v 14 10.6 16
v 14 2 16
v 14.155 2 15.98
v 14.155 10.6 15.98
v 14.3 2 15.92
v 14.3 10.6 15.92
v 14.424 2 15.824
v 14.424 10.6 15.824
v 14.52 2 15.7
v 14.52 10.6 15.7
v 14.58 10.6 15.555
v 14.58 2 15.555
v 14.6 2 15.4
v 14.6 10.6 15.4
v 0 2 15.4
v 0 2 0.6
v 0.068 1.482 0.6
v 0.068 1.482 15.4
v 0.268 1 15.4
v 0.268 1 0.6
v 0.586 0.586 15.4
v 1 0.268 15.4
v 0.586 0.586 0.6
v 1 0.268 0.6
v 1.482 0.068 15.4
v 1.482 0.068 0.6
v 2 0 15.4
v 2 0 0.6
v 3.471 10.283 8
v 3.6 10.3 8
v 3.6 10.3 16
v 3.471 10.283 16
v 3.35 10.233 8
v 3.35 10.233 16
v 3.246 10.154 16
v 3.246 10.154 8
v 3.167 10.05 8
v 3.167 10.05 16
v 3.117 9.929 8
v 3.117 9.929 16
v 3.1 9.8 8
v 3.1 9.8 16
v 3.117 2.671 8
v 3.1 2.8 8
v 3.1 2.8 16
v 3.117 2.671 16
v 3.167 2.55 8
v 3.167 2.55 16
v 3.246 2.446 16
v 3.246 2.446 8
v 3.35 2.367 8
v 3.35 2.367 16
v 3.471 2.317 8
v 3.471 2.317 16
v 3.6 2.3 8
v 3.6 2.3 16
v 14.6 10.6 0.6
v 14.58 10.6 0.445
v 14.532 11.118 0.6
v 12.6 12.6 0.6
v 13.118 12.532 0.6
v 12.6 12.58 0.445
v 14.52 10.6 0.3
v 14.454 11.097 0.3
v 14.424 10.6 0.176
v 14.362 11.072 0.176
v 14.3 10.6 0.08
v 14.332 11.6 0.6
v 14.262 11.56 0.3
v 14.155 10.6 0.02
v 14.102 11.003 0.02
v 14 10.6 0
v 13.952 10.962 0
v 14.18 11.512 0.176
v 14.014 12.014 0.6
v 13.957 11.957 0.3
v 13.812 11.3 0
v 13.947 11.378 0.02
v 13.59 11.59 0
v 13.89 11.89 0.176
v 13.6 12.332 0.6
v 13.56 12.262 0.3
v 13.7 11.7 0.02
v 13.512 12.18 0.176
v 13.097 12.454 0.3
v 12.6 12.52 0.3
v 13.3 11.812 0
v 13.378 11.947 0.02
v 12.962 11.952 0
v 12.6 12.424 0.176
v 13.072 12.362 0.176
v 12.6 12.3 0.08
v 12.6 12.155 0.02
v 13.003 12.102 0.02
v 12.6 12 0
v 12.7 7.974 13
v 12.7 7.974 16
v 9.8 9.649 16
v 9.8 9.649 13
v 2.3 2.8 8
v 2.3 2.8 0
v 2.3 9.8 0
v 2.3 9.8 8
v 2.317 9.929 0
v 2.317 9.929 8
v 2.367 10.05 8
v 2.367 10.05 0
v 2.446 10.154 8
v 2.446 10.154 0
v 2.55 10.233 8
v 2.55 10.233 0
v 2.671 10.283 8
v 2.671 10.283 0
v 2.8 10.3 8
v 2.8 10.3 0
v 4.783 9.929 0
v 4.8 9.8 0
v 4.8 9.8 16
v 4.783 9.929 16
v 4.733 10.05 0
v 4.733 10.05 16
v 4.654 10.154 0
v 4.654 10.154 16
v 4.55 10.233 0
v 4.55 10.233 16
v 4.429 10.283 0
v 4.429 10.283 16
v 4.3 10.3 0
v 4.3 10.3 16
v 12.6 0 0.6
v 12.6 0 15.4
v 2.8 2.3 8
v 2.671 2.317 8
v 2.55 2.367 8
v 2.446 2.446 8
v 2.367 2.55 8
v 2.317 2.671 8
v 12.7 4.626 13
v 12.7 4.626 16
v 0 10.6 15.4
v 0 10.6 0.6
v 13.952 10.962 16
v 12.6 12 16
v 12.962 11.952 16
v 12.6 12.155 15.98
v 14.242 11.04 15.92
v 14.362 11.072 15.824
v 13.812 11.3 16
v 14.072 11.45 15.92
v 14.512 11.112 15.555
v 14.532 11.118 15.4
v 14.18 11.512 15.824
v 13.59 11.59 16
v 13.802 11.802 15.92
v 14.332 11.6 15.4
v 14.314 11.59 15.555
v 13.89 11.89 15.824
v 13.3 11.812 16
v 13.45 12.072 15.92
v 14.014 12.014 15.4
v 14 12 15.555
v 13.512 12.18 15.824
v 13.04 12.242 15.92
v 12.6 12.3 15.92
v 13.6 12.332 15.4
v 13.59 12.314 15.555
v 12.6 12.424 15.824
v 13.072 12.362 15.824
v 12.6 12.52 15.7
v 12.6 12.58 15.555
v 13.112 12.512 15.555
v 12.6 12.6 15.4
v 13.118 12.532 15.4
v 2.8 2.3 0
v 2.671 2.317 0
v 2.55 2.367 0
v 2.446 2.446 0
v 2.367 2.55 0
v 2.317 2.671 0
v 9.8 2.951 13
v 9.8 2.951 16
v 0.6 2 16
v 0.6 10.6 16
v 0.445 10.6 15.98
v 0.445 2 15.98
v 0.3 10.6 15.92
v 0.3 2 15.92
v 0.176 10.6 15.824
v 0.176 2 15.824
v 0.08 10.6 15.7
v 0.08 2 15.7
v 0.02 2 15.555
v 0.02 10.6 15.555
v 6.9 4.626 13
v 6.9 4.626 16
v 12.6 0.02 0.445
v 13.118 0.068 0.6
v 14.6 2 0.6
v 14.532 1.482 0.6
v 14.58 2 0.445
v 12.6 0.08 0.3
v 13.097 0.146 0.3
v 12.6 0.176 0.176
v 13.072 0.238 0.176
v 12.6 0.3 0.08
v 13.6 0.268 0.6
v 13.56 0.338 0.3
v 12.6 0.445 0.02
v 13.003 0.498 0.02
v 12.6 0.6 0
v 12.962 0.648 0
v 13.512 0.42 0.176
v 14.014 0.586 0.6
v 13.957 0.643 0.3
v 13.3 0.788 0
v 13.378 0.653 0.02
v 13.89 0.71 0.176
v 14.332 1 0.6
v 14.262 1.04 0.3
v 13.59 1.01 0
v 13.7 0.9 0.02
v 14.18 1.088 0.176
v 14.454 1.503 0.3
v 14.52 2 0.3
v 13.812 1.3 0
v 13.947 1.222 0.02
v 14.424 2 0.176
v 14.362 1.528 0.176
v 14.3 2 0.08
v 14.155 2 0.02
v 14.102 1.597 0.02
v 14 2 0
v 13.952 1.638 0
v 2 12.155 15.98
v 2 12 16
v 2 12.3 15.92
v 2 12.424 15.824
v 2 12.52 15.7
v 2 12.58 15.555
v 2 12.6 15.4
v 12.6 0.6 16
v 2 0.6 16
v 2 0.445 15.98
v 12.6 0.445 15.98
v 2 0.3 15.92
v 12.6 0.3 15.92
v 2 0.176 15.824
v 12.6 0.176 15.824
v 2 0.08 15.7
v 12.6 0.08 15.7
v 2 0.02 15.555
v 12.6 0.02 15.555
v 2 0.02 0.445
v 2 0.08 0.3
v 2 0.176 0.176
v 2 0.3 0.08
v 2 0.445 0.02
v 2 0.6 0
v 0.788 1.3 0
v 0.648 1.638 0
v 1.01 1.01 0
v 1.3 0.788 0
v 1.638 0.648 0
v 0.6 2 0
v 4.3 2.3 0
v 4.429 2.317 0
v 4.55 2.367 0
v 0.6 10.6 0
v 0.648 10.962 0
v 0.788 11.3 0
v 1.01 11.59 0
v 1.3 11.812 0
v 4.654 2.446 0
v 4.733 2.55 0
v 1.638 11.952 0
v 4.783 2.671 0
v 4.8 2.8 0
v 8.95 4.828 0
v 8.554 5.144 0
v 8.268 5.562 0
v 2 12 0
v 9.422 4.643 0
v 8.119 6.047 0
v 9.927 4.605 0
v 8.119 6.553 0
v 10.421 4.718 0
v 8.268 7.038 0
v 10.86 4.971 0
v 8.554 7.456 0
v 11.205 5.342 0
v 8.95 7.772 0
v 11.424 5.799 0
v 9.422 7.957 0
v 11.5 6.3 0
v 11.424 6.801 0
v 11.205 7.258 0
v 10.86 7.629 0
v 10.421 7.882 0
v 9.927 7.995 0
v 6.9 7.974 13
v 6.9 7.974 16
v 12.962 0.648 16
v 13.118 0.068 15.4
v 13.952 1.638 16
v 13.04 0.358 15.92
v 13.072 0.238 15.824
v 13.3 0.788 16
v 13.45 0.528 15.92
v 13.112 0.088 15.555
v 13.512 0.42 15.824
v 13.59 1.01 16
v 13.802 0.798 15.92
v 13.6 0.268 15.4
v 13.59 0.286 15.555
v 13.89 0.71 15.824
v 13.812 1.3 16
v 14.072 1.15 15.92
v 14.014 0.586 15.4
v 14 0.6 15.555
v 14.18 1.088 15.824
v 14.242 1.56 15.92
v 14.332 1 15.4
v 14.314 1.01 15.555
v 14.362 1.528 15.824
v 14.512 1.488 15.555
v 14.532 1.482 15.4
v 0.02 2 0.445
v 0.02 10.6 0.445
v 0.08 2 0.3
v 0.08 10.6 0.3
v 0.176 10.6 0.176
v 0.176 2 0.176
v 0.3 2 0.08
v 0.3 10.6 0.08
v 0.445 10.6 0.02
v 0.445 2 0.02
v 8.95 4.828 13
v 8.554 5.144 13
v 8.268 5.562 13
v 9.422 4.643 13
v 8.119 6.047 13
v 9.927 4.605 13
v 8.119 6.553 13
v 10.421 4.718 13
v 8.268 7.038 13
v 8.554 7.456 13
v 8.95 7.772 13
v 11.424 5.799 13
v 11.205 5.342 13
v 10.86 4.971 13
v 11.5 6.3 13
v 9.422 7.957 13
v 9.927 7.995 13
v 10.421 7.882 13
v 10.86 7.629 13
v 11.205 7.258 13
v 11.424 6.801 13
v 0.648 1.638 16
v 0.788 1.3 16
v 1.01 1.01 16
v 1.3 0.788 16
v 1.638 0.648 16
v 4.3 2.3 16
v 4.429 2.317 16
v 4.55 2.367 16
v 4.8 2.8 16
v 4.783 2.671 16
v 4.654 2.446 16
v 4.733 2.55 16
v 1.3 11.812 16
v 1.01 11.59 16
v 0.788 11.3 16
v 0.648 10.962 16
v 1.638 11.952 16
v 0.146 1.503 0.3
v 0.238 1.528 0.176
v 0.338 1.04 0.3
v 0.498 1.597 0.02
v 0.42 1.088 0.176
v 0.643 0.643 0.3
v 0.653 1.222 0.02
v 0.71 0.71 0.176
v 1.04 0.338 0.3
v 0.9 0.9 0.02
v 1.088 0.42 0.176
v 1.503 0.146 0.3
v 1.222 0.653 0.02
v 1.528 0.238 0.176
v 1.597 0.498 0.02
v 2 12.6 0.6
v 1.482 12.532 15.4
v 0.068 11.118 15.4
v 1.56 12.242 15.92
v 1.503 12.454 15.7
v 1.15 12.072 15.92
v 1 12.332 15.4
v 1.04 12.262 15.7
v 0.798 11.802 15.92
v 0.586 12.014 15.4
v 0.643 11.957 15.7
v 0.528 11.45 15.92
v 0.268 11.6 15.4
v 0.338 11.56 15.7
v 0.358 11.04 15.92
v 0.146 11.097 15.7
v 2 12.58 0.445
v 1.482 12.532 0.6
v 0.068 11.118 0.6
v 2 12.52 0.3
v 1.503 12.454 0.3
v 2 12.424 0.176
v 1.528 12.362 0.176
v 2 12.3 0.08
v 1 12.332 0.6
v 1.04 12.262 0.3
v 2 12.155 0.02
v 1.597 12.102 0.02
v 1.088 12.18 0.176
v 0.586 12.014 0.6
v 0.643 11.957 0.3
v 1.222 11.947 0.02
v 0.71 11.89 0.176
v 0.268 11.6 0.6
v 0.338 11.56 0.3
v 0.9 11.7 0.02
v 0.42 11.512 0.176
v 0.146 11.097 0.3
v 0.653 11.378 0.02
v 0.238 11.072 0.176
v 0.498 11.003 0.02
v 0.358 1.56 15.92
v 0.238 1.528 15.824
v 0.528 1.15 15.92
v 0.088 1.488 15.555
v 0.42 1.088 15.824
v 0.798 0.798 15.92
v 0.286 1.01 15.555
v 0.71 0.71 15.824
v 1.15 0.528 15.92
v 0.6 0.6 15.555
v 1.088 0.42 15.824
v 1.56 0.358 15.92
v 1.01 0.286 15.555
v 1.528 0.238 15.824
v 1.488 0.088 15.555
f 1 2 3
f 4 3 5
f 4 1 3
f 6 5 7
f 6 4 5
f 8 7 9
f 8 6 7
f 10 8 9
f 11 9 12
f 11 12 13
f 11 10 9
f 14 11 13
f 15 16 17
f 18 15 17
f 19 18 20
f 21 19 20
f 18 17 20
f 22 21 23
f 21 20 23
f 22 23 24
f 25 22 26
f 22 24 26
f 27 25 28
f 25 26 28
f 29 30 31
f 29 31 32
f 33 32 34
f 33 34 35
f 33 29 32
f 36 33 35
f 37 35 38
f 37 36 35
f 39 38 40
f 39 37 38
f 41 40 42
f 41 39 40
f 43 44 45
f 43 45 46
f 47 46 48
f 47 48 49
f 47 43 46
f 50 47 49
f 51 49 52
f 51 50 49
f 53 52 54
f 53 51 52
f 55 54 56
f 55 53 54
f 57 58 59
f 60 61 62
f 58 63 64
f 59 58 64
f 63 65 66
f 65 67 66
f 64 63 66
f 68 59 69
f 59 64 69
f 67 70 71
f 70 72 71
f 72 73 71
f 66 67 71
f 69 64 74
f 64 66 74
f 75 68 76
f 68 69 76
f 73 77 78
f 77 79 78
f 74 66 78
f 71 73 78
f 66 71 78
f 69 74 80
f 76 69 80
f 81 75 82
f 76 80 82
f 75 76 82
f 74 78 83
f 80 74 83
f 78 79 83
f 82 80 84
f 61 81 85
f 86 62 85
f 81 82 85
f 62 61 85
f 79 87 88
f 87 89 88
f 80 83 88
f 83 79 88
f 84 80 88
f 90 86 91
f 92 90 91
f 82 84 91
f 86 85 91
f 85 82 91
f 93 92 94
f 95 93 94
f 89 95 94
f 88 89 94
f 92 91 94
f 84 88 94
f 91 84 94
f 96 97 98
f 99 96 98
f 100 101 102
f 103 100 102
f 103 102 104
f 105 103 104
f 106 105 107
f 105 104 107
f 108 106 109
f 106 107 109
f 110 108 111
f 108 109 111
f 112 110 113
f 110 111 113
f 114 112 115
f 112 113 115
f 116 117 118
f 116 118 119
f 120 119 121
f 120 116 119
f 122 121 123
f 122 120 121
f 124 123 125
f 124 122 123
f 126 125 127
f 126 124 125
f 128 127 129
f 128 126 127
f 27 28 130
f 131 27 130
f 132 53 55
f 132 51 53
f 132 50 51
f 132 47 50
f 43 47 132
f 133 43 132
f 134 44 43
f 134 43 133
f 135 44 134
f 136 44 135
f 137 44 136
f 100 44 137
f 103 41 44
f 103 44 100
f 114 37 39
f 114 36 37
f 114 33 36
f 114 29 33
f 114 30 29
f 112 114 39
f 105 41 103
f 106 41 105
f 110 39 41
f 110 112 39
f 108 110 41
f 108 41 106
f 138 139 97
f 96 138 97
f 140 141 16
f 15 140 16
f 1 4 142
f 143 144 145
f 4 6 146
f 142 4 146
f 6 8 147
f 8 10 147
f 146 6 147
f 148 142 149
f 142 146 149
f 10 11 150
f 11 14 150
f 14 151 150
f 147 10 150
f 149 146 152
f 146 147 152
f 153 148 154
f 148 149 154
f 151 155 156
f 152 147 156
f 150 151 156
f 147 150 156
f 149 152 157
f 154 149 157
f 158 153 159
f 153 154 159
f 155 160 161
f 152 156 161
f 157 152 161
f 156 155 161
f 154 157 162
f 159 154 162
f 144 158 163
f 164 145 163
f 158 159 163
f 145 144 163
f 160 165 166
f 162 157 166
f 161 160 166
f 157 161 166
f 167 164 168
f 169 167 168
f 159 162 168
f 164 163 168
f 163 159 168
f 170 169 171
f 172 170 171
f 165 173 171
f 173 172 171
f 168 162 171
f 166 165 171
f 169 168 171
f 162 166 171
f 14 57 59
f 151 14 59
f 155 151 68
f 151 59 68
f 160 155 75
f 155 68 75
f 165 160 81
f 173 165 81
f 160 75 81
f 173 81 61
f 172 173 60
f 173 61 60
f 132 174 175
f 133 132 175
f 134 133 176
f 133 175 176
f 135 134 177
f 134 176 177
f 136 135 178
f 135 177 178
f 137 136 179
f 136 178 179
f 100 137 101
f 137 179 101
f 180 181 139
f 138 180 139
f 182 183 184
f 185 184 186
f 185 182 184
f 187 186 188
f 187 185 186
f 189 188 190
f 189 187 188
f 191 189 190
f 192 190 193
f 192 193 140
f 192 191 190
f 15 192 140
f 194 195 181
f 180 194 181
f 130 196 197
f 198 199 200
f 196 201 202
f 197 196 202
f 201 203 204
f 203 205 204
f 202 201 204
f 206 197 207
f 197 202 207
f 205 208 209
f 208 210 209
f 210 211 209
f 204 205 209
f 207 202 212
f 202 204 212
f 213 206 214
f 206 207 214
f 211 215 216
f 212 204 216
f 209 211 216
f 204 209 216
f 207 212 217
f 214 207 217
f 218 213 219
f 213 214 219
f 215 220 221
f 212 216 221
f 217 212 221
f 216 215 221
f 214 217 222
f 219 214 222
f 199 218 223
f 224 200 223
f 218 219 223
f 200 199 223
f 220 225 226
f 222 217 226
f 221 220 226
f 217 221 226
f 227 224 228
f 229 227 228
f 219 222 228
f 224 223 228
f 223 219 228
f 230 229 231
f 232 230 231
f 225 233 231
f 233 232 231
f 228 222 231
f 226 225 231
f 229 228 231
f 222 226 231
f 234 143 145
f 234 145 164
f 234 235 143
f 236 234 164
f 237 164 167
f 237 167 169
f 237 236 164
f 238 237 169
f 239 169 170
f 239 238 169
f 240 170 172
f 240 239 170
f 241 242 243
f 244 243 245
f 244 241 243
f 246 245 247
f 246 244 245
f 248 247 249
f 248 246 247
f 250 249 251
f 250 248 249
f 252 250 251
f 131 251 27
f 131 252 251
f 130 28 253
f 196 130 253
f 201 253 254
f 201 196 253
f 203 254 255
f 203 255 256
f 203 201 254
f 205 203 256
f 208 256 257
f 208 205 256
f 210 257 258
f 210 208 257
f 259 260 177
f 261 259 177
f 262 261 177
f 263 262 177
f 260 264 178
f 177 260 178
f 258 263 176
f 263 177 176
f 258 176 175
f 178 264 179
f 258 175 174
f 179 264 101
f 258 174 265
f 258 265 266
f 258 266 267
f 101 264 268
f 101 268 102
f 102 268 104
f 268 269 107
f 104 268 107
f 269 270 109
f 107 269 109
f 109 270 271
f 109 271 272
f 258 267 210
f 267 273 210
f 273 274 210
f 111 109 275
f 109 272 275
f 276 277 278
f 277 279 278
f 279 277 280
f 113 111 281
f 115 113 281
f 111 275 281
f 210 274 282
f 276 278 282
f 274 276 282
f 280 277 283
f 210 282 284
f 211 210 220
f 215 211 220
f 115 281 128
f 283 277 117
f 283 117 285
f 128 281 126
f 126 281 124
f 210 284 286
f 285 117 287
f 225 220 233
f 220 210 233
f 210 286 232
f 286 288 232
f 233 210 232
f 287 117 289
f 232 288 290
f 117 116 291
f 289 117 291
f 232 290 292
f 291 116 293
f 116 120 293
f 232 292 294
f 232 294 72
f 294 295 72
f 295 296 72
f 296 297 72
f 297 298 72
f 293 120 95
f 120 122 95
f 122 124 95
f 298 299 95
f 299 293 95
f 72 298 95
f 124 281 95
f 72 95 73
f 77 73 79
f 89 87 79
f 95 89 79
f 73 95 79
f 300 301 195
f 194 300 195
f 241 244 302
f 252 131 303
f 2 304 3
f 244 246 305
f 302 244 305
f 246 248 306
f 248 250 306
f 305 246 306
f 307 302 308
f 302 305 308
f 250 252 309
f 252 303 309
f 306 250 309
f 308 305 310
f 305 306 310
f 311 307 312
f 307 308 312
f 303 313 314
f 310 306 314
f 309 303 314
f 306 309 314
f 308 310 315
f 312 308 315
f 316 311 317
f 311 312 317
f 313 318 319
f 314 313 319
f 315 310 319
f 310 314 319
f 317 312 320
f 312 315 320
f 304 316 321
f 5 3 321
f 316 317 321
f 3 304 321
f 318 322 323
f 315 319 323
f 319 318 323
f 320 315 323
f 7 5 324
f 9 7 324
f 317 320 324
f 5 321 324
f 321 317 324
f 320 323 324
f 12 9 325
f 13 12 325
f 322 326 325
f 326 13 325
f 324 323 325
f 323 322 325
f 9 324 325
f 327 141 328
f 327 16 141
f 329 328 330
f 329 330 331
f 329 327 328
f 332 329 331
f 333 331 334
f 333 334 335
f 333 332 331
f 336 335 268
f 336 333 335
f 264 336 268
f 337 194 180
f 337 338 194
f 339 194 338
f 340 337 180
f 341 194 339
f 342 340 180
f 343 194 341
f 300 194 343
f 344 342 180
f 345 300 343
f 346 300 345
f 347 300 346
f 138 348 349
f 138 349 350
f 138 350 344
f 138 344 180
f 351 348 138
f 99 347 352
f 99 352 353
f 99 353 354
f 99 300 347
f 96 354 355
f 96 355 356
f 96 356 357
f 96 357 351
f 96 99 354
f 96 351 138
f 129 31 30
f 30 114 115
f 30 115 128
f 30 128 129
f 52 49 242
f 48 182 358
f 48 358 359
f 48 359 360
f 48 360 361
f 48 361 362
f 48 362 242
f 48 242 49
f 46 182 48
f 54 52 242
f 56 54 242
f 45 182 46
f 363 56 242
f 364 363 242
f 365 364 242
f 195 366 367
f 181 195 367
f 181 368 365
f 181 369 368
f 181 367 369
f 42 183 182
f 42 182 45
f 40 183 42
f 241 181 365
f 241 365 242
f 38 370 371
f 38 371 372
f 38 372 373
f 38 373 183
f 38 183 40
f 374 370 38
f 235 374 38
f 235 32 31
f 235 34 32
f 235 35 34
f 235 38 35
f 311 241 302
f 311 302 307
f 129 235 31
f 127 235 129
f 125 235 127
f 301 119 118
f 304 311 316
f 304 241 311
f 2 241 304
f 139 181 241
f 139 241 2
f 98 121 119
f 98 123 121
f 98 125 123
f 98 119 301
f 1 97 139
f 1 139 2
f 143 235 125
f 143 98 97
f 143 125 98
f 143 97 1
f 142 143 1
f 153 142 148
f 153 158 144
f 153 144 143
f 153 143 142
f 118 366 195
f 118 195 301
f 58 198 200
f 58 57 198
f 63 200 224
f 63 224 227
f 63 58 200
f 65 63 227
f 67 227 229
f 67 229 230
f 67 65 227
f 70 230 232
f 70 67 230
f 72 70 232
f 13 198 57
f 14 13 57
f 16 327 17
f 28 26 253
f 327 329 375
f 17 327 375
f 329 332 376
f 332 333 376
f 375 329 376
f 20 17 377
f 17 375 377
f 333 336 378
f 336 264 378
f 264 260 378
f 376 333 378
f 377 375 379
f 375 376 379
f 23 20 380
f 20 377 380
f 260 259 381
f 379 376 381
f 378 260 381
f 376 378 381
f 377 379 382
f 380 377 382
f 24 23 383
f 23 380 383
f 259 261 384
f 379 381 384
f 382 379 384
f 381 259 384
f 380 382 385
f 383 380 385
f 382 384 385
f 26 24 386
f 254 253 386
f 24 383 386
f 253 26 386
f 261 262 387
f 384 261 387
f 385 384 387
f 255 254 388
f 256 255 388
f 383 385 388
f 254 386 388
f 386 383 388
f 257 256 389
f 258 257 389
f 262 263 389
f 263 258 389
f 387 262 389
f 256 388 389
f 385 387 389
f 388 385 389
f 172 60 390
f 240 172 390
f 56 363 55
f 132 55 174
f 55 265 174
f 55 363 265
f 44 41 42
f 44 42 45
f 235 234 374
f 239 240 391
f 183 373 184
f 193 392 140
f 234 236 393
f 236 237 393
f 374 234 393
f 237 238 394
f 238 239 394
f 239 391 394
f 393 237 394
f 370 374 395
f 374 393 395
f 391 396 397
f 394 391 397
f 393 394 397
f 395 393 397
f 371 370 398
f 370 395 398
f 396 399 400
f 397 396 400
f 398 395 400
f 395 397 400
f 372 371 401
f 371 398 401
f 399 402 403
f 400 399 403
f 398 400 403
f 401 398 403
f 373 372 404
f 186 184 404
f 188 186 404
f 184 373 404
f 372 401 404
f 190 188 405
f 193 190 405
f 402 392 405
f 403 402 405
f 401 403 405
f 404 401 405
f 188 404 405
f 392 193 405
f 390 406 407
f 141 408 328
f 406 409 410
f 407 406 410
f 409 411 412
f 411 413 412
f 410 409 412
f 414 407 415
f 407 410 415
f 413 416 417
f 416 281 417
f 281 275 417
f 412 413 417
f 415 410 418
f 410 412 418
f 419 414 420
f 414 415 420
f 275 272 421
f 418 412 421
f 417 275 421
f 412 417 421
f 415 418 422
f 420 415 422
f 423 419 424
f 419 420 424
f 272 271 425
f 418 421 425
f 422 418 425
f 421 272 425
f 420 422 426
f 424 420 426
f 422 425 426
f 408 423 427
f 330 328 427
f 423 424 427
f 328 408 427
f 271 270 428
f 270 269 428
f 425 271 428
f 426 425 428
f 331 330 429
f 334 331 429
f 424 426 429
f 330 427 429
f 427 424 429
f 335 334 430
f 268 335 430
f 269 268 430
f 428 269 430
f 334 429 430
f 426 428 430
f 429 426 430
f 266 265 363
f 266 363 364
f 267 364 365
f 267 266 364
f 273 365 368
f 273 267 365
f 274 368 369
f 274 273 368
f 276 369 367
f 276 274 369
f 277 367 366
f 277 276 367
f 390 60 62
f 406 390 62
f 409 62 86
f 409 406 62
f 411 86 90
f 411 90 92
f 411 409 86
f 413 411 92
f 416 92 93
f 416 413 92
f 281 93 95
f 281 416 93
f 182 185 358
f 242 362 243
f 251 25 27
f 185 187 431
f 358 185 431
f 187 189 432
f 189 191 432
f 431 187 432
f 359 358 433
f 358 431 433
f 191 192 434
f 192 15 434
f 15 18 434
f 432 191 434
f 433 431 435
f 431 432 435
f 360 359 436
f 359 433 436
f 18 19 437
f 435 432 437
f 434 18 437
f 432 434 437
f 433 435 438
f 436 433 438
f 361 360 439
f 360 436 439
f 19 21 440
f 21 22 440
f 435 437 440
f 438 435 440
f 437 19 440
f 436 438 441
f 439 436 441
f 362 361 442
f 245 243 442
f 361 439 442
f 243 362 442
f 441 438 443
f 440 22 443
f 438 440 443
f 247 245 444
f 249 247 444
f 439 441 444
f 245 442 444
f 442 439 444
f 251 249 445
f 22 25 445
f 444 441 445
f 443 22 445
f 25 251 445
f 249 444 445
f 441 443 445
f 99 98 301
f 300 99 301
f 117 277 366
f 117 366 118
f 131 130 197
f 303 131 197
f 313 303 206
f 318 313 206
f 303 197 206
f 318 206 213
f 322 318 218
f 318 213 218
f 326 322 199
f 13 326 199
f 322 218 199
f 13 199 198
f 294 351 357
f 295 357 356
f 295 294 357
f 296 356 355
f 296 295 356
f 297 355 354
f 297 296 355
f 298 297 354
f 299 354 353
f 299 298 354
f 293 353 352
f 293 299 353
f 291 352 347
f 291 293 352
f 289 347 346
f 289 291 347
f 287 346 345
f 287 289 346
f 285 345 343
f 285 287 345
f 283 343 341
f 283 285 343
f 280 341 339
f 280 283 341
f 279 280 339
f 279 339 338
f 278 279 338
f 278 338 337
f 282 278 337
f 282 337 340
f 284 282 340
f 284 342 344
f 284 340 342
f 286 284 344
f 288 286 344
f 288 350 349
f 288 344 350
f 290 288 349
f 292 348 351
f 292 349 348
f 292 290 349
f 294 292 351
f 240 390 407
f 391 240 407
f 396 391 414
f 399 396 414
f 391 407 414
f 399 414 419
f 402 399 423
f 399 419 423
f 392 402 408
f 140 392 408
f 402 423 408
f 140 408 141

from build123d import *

# Parameters (mm, degrees)
SKETCH1_R           = 1.7
BOSS_EXTRUDE1_DEPTH = 16
CUT_EXTRUDE1_DEPTH  = 3
CUT_EXTRUDE2_DEPTH  = 8
FILLET1_R           = 0.6


with BuildPart() as part:
    # Sketch1 → Boss-Extrude1 (new body)
    with BuildSketch(Plane.XY):
        with BuildLine():
            Line((2, 0), (12.6, 0))
            ThreePointArc((12.6, 0), (14.014213562, 0.585786438), (14.6, 2))
            Line((14.6, 2), (14.6, 10.6))
            ThreePointArc((14.6, 10.6), (14.014213562, 12.014213562), (12.6, 12.6))
            Line((12.6, 12.6), (2, 12.6))
            ThreePointArc((2, 12.6), (0.585786438, 12.014213562), (0, 10.6))
            Line((0, 10.6), (0, 2))
            ThreePointArc((0, 2), (0.585786438, 0.585786438), (2, 0))
        make_face()
        with Locations((9.8, 6.3)):
            Circle(SKETCH1_R, mode=Mode.SUBTRACT)
        with BuildLine():
            Line((3.1, 9.8), (3.1, 2.8))
            ThreePointArc((3.1, 2.8), (3.246446609, 2.446446609), (3.6, 2.3))
            Line((3.6, 2.3), (4.3, 2.3))
            ThreePointArc((4.3, 2.3), (4.653553391, 2.446446609), (4.8, 2.8))
            Line((4.8, 2.8), (4.8, 9.8))
            ThreePointArc((4.8, 9.8), (4.653553391, 10.153553391), (4.3, 10.3))
            Line((4.3, 10.3), (3.6, 10.3))
            ThreePointArc((3.6, 10.3), (3.246446609, 10.153553391), (3.1, 9.8))
        make_face(mode=Mode.SUBTRACT)
    extrude(amount=BOSS_EXTRUDE1_DEPTH)

    # Sketch2 → Cut-Extrude1 (cut)
    with BuildSketch(Plane.XY.offset(16)):
        Polygon((9.8, 9.648631561), (6.9, 7.974315781), (6.9, 4.625684219), (9.8, 2.951368439), (12.7, 4.625684219), (12.7, 7.974315781), align=None)
    extrude(amount=-CUT_EXTRUDE1_DEPTH, mode=Mode.SUBTRACT)

    # Sketch3 → Cut-Extrude2 (cut)
    with BuildSketch(Plane(origin=(0, 0, 0), x_dir=(-1, 0, 0), z_dir=(0, 0, -1))):
        with BuildLine():
            Line((-4.8, 9.8), (-4.8, 2.8))
            ThreePointArc((-4.8, 2.8), (-4.653553391, 2.446446609), (-4.3, 2.3))
            Line((-4.3, 2.3), (-2.8, 2.3))
            ThreePointArc((-2.8, 2.3), (-2.446446609, 2.446446609), (-2.3, 2.8))
            Line((-2.3, 2.8), (-2.3, 9.8))
            ThreePointArc((-2.3, 9.8), (-2.446446609, 10.153553391), (-2.8, 10.3))
            Line((-2.8, 10.3), (-4.3, 10.3))
            ThreePointArc((-4.3, 10.3), (-4.653553391, 10.153553391), (-4.8, 9.8))
        make_face()
    extrude(amount=-CUT_EXTRUDE2_DEPTH, mode=Mode.SUBTRACT)

    # Fillet1
    fillet1_edges = [part.edges().sort_by_distance(p)[0] for p in [
        (0, 6.3, 0),
        (0.585786438, 12.014213562, 0),
        (7.3, 12.6, 0),
        (14.014213562, 12.014213562, 0),
        (0.585786438, 12.014213562, 16),
        (0, 6.3, 16),
        (0.585786438, 0.585786438, 16),
        (7.3, 0, 16),
        (14.014213562, 0.585786438, 16),
        (14.6, 6.3, 16),
        (14.014213562, 12.014213562, 16),
        (14.6, 6.3, 0),
        (7.3, 12.6, 16),
        (14.014213562, 0.585786438, 0),
        (7.3, 0, 0),
        (0.585786438, 0.585786438, 0),
    ]]
    fillet(fillet1_edges, radius=FILLET1_R)


solid = part.part
